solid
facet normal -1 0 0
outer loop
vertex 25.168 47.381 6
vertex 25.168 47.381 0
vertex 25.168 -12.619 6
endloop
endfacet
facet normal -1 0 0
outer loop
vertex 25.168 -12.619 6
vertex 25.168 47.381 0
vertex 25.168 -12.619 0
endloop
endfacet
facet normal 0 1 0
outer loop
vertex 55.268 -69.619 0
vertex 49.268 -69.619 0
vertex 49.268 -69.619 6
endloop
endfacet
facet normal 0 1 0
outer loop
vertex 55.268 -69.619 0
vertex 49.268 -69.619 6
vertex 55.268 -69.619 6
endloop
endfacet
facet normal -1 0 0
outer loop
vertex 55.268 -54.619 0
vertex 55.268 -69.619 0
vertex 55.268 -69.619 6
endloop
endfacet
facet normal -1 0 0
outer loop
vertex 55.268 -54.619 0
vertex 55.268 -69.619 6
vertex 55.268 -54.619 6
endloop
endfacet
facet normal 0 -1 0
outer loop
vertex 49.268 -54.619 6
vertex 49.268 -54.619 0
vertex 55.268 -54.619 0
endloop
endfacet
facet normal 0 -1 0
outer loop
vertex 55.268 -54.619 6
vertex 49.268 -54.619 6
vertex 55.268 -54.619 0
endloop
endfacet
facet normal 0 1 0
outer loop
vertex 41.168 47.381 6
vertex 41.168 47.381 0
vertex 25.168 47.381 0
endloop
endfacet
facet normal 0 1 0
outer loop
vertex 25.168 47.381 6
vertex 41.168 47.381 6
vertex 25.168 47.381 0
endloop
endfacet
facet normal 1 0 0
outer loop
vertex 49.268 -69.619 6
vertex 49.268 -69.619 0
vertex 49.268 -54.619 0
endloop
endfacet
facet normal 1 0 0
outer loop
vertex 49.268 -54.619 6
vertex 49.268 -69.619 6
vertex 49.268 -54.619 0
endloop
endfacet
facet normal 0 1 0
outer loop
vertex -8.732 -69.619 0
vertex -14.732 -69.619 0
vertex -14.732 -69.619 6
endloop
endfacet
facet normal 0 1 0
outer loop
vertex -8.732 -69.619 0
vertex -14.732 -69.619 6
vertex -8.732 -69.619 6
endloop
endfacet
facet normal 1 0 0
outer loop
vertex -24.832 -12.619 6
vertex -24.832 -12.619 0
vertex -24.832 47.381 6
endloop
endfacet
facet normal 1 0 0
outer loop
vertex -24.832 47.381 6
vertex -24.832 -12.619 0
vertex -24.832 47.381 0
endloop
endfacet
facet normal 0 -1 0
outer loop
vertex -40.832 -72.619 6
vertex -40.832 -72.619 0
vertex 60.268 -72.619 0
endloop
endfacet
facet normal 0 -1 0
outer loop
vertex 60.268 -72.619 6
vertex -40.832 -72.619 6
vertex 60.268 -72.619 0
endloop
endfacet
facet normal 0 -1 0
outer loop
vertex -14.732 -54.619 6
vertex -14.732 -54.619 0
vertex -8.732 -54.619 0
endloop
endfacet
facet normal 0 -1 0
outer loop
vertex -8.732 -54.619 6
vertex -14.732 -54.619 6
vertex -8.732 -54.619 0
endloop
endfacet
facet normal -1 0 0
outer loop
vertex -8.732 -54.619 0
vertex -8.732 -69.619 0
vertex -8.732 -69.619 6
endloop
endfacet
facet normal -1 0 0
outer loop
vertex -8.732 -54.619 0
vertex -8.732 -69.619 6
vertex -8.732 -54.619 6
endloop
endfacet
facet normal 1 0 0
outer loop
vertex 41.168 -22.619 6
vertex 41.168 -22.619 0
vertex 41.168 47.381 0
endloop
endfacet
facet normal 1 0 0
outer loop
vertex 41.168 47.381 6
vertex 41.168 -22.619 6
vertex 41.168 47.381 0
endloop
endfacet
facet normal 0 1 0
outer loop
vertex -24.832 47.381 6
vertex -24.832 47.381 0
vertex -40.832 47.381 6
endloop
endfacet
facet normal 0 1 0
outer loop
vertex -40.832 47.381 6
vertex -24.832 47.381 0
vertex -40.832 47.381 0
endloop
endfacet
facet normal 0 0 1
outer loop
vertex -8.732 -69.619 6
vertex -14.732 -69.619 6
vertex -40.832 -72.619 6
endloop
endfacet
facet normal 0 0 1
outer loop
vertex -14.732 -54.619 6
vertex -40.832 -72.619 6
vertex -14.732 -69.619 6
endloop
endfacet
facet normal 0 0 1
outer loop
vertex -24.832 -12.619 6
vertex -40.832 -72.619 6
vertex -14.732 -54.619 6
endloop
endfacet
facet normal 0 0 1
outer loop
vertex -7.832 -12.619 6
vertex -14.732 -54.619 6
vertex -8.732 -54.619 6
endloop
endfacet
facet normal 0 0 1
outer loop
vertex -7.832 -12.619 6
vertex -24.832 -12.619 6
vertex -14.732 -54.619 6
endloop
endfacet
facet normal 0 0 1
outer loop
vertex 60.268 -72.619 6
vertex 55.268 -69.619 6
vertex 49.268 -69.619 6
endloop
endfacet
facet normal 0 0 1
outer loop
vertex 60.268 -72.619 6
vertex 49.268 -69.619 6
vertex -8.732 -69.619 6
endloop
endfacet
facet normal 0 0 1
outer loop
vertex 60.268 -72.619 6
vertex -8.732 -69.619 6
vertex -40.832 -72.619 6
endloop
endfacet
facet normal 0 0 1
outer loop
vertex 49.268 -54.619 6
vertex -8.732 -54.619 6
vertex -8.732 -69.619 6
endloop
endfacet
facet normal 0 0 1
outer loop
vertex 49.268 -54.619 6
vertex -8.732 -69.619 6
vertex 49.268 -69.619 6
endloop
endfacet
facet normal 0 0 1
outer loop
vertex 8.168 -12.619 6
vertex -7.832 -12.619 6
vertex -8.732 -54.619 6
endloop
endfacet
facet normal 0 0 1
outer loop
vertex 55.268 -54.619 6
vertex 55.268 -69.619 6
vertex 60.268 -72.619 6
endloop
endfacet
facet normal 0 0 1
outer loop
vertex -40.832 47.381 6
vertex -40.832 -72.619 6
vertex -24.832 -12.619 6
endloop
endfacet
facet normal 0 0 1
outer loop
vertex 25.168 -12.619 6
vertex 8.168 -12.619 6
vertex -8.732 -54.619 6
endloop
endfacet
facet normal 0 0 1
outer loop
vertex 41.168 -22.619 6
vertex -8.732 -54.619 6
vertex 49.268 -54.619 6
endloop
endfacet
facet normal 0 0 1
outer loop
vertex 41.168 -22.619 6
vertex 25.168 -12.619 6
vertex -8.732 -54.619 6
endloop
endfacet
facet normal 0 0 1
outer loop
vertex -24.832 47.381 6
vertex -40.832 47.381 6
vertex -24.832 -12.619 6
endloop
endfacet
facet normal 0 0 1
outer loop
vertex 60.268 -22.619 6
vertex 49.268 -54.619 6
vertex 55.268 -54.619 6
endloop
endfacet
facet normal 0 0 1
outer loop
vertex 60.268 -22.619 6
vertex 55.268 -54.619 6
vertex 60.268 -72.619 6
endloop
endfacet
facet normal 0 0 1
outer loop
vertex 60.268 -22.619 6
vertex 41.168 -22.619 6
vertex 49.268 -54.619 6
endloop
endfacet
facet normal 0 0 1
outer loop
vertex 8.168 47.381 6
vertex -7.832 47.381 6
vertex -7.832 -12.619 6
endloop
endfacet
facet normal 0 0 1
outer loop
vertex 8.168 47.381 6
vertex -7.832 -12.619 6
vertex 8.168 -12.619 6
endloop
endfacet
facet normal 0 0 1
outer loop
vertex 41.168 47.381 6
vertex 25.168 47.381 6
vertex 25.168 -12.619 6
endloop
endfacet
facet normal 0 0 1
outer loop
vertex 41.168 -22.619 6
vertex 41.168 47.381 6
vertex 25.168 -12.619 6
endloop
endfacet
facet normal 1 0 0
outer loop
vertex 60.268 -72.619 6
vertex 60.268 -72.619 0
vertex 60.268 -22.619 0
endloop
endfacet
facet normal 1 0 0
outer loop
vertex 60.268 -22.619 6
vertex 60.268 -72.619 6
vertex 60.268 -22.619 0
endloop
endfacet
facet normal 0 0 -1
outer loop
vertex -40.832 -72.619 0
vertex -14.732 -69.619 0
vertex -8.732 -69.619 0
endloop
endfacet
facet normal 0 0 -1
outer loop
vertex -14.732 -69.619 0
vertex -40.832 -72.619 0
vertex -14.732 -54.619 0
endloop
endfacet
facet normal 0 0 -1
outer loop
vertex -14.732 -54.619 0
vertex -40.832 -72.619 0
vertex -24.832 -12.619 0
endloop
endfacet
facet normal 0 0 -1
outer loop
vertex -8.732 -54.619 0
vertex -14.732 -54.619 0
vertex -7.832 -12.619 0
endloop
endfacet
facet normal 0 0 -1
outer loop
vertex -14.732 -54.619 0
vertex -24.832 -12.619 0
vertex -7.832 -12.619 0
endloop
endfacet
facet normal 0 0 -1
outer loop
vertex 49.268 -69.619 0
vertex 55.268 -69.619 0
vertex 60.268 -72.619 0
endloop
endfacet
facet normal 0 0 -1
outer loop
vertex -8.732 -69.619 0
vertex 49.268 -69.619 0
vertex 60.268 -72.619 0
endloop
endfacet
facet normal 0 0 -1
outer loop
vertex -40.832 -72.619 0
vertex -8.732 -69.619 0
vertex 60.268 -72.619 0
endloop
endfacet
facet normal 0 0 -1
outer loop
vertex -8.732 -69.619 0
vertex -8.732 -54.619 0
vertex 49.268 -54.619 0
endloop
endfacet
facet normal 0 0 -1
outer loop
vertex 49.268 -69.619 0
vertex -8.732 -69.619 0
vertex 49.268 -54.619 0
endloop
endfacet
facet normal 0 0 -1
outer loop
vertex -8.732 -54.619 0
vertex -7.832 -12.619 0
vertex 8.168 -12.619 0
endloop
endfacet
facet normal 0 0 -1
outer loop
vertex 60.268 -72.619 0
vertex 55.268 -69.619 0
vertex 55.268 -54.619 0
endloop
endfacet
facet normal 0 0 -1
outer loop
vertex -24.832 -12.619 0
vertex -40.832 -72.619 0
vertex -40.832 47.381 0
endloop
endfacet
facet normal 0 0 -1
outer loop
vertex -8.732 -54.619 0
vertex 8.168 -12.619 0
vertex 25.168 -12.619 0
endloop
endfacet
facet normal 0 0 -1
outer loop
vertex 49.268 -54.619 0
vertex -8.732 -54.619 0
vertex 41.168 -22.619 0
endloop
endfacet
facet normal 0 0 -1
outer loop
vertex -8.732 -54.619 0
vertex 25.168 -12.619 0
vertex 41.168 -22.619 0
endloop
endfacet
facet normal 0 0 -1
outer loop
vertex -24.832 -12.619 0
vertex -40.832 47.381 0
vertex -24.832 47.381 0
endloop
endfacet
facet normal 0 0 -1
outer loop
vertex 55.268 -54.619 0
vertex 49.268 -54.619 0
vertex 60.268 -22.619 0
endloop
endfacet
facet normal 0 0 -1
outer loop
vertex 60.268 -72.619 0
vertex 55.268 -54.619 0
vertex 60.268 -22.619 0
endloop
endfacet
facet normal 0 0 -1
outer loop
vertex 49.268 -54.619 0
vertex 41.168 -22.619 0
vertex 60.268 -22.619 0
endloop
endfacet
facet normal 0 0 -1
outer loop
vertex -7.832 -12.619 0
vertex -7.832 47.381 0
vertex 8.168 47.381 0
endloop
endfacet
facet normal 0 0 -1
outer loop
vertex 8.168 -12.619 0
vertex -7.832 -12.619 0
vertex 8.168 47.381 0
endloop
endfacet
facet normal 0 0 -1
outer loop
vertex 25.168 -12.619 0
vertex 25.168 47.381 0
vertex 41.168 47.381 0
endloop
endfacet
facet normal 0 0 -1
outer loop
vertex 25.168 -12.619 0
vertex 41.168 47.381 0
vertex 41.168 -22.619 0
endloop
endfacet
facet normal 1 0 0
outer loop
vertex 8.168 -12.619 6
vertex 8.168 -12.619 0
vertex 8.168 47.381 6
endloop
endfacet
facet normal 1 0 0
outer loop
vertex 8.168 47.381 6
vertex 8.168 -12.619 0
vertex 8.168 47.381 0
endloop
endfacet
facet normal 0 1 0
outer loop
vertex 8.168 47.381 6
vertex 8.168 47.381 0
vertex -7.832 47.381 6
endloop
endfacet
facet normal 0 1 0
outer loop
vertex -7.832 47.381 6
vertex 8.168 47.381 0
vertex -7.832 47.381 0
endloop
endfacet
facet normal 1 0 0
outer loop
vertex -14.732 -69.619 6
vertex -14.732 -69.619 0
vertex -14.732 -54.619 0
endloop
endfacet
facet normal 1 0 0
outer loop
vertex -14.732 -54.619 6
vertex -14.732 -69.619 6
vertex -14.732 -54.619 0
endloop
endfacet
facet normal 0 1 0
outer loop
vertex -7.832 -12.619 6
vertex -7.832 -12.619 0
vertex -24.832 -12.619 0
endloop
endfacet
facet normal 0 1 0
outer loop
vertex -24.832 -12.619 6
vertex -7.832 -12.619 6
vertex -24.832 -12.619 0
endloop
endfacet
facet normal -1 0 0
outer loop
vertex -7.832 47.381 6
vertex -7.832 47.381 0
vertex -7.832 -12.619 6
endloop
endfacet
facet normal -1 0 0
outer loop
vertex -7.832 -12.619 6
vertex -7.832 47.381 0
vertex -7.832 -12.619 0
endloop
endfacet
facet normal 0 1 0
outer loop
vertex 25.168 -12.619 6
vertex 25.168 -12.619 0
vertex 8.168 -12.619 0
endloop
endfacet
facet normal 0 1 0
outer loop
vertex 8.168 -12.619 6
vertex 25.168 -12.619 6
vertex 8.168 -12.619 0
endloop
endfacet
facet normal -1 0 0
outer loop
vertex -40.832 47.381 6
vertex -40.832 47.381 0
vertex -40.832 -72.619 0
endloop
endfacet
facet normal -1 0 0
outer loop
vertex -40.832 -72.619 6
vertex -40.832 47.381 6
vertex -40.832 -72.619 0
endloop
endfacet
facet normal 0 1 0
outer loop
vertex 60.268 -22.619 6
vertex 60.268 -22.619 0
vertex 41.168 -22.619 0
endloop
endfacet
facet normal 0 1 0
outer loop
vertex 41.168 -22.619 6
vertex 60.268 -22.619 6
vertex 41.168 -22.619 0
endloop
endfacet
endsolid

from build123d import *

# Parameters (mm, degrees)
ESQUISSE1_W        = 6
ESQUISSE1_H        = 15
BOSS_EXTRU_1_DEPTH = 6


with BuildPart() as part:
    # Esquisse1 → Boss.-Extru.1 (new body)
    with BuildSketch(Plane.XY):
        Polygon((25.167583758, 47.381284916), (25.167583758, -12.618715084), (8.167583758, -12.618715084), (8.167583758, 47.381284916), (-7.832416242, 47.381284916), (-7.832416242, -12.618715084), (-24.832416242, -12.618715084), (-24.832416242, 47.381284916), (-40.832416242, 47.381284916), (-40.832416242, -72.618715084), (60.267583758, -72.618715084), (60.267583758, -22.618715084), (41.167583758, -22.618715084), (41.167583758, 47.381284916), align=None)
        with Locations((52.267583758, -62.118715084)):
            Rectangle(ESQUISSE1_W, ESQUISSE1_H, mode=Mode.SUBTRACT)
        with Locations((-11.732416242, -62.118715084)):
            Rectangle(ESQUISSE1_W, ESQUISSE1_H, mode=Mode.SUBTRACT)
    extrude(amount=BOSS_EXTRU_1_DEPTH)


solid = part.part
